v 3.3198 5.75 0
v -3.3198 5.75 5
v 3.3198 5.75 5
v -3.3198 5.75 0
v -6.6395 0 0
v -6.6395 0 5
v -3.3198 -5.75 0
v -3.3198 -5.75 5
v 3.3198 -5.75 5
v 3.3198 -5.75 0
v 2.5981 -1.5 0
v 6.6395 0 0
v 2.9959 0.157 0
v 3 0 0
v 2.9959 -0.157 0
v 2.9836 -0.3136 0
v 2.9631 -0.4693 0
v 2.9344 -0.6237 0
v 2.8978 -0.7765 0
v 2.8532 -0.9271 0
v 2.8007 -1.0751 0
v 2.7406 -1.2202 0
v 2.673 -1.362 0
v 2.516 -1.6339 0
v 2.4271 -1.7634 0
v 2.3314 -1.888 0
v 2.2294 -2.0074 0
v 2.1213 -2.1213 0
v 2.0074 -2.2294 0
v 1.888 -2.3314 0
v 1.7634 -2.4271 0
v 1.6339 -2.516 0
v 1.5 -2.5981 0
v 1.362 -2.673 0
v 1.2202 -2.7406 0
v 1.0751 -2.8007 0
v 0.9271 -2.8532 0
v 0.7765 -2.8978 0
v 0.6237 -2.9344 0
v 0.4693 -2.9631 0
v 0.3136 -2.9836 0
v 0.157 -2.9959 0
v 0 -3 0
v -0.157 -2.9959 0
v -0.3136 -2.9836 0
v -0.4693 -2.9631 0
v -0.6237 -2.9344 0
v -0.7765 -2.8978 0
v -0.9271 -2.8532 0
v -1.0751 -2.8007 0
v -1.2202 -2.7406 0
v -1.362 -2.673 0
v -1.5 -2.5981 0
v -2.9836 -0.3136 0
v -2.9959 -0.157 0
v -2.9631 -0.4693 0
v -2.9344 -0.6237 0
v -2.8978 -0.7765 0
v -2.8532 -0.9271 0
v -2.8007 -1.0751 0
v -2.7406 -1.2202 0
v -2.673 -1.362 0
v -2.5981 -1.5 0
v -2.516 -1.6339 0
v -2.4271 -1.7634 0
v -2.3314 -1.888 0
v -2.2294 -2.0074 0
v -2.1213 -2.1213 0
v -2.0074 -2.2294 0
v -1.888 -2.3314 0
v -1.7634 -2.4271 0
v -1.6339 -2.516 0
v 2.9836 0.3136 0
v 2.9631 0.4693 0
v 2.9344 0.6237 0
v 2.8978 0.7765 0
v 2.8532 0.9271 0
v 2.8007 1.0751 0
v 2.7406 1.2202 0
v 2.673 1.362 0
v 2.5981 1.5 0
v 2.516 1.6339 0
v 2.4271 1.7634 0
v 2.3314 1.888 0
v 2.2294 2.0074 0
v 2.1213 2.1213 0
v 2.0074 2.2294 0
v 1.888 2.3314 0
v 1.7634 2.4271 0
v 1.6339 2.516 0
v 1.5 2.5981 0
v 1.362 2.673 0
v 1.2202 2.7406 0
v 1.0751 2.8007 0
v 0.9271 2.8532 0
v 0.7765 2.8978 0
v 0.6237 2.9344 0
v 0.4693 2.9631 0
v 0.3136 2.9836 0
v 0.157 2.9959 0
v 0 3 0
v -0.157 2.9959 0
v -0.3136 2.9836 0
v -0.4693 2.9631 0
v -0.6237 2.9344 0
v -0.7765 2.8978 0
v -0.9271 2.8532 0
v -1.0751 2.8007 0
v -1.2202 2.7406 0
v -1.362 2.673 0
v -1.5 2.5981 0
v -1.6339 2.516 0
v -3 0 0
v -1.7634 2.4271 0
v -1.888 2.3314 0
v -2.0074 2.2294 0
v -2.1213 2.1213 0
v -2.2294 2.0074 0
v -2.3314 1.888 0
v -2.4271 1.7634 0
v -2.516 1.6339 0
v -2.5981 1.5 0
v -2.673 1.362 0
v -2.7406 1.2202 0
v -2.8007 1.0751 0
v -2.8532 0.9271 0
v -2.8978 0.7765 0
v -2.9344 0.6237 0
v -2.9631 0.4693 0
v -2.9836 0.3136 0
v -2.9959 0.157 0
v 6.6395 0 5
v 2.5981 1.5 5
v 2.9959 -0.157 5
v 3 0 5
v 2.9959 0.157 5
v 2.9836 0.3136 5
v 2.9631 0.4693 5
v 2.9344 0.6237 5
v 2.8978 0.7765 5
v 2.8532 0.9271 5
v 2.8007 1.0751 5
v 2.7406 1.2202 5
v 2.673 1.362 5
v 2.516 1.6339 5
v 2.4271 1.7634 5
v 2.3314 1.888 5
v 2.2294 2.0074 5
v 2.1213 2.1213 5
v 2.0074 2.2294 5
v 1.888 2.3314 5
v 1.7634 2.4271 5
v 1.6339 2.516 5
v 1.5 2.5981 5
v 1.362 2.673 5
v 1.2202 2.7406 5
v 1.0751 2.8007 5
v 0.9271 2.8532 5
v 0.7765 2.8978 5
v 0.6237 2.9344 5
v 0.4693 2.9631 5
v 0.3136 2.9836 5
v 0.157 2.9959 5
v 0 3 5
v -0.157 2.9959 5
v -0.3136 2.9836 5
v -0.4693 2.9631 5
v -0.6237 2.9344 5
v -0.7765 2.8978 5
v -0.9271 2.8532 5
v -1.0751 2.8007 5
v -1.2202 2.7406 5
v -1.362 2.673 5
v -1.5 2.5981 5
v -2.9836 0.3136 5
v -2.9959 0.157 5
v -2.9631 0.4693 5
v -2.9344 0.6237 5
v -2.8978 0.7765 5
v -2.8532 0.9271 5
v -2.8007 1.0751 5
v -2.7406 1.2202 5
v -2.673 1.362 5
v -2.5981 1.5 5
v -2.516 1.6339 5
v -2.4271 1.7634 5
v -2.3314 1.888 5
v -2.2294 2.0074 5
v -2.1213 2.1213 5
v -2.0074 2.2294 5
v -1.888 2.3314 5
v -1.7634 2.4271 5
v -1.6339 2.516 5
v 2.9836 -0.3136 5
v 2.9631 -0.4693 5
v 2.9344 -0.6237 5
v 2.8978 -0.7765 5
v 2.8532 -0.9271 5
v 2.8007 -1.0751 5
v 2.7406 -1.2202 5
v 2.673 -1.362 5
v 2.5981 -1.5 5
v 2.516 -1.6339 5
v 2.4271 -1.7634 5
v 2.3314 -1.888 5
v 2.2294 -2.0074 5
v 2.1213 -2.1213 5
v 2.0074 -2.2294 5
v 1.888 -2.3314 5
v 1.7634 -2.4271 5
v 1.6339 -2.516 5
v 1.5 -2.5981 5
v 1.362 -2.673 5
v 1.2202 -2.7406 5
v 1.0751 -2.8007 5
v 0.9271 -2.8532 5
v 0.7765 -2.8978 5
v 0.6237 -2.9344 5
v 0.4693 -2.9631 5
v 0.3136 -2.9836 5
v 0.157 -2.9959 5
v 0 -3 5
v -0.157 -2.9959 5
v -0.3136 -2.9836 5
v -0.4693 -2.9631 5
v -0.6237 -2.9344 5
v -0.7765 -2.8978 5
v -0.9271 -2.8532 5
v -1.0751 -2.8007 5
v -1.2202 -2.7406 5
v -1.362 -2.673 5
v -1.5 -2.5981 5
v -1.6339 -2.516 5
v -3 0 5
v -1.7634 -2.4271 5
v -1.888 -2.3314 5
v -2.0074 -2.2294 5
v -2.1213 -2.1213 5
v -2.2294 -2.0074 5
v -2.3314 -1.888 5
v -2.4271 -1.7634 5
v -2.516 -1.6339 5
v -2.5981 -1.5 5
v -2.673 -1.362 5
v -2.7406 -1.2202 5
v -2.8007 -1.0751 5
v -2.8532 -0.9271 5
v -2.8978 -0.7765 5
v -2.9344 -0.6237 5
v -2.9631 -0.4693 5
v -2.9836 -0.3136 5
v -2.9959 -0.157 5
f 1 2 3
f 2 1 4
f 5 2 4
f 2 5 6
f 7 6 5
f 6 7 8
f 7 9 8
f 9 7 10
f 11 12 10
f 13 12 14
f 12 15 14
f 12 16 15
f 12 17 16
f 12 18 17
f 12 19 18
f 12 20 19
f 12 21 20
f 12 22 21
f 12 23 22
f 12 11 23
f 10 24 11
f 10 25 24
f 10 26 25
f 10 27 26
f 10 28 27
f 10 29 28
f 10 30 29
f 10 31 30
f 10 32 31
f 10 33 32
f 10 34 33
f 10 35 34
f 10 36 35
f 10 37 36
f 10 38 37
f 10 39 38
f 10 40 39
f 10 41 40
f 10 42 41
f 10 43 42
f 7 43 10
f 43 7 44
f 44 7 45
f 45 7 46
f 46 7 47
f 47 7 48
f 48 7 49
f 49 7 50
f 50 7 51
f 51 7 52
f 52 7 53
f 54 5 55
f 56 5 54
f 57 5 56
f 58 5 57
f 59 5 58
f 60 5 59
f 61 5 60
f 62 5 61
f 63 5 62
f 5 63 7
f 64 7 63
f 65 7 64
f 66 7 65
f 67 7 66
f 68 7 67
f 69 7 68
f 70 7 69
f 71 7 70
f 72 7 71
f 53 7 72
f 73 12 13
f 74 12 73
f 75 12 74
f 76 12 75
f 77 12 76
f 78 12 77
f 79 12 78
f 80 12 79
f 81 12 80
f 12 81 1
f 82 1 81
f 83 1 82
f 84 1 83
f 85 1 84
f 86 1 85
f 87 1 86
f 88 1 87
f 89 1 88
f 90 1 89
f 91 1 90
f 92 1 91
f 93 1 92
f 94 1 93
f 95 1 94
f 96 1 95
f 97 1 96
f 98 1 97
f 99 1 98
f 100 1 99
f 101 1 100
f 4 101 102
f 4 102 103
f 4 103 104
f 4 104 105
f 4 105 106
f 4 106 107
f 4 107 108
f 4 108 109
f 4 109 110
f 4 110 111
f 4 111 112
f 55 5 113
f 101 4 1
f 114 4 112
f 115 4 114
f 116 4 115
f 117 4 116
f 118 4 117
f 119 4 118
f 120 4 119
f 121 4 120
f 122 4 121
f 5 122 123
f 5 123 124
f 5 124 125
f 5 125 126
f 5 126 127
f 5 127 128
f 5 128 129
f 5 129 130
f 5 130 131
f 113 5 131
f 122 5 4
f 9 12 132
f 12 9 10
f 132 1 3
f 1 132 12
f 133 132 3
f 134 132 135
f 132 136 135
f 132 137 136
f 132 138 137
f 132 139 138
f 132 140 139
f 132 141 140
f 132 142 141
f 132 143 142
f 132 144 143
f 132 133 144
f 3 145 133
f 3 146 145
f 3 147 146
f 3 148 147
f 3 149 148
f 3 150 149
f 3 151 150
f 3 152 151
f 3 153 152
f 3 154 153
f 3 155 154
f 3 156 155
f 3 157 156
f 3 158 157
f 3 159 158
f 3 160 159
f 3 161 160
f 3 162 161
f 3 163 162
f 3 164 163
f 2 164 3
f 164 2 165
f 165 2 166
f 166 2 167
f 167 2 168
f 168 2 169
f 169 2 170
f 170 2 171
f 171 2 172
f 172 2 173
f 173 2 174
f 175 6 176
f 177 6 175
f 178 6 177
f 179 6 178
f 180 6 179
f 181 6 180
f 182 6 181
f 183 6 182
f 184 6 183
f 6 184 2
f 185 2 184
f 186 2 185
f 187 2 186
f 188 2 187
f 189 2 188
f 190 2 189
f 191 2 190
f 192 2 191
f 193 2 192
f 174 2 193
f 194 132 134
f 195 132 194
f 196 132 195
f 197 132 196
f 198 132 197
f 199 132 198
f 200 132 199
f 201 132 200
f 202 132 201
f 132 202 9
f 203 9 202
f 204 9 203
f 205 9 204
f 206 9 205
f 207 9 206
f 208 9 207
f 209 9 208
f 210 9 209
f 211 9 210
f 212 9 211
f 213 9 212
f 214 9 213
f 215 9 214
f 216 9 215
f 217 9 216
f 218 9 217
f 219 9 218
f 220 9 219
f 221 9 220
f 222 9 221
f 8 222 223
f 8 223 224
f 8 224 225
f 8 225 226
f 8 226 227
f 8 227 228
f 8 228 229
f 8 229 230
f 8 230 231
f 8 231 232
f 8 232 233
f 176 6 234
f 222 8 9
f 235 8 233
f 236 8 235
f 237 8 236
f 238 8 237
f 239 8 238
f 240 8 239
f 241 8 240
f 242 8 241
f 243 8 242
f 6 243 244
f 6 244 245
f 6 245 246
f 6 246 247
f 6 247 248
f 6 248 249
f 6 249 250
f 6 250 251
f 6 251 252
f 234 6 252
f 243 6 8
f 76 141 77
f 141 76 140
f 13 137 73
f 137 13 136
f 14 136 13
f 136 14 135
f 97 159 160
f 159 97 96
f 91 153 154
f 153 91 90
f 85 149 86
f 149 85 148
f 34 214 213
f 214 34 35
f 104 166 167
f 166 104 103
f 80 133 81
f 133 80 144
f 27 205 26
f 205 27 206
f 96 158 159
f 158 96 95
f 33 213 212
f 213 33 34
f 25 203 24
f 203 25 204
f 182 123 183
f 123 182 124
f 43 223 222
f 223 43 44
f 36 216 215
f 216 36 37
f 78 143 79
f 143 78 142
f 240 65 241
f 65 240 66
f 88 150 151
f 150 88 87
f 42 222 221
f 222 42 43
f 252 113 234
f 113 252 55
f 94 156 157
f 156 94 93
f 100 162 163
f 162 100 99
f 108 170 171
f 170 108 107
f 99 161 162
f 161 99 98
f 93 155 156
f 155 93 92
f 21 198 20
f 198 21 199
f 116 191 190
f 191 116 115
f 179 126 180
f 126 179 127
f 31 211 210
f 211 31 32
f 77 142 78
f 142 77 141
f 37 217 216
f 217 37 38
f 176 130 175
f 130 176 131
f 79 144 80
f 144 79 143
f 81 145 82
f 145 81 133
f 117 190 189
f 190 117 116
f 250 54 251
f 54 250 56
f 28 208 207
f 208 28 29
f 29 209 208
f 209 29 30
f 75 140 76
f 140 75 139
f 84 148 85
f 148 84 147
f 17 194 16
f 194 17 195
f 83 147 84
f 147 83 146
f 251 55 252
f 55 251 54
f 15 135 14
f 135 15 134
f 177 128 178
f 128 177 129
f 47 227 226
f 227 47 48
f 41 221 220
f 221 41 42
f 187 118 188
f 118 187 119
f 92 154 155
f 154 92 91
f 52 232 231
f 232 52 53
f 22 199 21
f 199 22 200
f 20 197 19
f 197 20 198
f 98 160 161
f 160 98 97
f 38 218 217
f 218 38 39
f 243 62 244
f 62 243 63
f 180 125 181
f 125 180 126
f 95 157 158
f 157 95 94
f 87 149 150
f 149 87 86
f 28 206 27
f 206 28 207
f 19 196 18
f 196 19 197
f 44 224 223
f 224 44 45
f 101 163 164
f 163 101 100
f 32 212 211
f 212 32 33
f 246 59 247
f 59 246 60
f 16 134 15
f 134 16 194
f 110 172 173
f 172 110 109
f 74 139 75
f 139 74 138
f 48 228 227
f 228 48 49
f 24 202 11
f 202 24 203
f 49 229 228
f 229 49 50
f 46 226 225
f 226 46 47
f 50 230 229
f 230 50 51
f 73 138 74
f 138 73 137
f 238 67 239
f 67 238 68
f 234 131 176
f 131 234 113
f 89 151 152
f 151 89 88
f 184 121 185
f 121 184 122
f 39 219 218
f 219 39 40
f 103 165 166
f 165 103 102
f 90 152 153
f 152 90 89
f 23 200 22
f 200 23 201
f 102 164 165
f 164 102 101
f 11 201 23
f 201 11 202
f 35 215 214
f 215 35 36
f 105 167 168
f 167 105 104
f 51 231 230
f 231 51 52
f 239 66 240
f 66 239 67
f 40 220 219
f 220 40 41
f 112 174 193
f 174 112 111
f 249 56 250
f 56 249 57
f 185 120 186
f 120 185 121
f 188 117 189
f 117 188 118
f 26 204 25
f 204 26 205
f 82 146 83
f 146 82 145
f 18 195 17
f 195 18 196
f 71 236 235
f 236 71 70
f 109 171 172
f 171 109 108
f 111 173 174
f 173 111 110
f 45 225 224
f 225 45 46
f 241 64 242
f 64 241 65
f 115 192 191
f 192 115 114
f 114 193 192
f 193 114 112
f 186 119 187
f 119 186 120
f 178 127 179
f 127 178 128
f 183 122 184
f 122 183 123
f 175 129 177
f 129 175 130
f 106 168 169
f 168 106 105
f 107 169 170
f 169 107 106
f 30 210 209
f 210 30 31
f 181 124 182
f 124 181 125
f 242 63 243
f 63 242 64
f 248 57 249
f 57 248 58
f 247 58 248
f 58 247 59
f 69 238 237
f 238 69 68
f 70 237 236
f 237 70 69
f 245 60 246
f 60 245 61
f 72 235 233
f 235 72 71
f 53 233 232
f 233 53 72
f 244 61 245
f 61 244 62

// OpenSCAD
$fn = 120;

across_flats = 11.5;   // mm
thickness    = 5.0;    // mm
hole_d       = 6.0;    // mm (clearance hole as specified)

module hex_prism_af(af, h){
    // For a regular hexagon: across flats = 2 * apothem
    // circumradius R = apothem / cos(30°) = (af/2) / cos(30°)
    R = (af/2) / cos(30);
    linear_extrude(height=h)
        polygon(points=[for(i=[0:5]) [R*cos(60*i), R*sin(60*i)]]);
}

difference(){
    hex_prism_af(across_flats, thickness);
    translate([0,0,-0.1])
        cylinder(d=hole_d, h=thickness+0.2);
}
